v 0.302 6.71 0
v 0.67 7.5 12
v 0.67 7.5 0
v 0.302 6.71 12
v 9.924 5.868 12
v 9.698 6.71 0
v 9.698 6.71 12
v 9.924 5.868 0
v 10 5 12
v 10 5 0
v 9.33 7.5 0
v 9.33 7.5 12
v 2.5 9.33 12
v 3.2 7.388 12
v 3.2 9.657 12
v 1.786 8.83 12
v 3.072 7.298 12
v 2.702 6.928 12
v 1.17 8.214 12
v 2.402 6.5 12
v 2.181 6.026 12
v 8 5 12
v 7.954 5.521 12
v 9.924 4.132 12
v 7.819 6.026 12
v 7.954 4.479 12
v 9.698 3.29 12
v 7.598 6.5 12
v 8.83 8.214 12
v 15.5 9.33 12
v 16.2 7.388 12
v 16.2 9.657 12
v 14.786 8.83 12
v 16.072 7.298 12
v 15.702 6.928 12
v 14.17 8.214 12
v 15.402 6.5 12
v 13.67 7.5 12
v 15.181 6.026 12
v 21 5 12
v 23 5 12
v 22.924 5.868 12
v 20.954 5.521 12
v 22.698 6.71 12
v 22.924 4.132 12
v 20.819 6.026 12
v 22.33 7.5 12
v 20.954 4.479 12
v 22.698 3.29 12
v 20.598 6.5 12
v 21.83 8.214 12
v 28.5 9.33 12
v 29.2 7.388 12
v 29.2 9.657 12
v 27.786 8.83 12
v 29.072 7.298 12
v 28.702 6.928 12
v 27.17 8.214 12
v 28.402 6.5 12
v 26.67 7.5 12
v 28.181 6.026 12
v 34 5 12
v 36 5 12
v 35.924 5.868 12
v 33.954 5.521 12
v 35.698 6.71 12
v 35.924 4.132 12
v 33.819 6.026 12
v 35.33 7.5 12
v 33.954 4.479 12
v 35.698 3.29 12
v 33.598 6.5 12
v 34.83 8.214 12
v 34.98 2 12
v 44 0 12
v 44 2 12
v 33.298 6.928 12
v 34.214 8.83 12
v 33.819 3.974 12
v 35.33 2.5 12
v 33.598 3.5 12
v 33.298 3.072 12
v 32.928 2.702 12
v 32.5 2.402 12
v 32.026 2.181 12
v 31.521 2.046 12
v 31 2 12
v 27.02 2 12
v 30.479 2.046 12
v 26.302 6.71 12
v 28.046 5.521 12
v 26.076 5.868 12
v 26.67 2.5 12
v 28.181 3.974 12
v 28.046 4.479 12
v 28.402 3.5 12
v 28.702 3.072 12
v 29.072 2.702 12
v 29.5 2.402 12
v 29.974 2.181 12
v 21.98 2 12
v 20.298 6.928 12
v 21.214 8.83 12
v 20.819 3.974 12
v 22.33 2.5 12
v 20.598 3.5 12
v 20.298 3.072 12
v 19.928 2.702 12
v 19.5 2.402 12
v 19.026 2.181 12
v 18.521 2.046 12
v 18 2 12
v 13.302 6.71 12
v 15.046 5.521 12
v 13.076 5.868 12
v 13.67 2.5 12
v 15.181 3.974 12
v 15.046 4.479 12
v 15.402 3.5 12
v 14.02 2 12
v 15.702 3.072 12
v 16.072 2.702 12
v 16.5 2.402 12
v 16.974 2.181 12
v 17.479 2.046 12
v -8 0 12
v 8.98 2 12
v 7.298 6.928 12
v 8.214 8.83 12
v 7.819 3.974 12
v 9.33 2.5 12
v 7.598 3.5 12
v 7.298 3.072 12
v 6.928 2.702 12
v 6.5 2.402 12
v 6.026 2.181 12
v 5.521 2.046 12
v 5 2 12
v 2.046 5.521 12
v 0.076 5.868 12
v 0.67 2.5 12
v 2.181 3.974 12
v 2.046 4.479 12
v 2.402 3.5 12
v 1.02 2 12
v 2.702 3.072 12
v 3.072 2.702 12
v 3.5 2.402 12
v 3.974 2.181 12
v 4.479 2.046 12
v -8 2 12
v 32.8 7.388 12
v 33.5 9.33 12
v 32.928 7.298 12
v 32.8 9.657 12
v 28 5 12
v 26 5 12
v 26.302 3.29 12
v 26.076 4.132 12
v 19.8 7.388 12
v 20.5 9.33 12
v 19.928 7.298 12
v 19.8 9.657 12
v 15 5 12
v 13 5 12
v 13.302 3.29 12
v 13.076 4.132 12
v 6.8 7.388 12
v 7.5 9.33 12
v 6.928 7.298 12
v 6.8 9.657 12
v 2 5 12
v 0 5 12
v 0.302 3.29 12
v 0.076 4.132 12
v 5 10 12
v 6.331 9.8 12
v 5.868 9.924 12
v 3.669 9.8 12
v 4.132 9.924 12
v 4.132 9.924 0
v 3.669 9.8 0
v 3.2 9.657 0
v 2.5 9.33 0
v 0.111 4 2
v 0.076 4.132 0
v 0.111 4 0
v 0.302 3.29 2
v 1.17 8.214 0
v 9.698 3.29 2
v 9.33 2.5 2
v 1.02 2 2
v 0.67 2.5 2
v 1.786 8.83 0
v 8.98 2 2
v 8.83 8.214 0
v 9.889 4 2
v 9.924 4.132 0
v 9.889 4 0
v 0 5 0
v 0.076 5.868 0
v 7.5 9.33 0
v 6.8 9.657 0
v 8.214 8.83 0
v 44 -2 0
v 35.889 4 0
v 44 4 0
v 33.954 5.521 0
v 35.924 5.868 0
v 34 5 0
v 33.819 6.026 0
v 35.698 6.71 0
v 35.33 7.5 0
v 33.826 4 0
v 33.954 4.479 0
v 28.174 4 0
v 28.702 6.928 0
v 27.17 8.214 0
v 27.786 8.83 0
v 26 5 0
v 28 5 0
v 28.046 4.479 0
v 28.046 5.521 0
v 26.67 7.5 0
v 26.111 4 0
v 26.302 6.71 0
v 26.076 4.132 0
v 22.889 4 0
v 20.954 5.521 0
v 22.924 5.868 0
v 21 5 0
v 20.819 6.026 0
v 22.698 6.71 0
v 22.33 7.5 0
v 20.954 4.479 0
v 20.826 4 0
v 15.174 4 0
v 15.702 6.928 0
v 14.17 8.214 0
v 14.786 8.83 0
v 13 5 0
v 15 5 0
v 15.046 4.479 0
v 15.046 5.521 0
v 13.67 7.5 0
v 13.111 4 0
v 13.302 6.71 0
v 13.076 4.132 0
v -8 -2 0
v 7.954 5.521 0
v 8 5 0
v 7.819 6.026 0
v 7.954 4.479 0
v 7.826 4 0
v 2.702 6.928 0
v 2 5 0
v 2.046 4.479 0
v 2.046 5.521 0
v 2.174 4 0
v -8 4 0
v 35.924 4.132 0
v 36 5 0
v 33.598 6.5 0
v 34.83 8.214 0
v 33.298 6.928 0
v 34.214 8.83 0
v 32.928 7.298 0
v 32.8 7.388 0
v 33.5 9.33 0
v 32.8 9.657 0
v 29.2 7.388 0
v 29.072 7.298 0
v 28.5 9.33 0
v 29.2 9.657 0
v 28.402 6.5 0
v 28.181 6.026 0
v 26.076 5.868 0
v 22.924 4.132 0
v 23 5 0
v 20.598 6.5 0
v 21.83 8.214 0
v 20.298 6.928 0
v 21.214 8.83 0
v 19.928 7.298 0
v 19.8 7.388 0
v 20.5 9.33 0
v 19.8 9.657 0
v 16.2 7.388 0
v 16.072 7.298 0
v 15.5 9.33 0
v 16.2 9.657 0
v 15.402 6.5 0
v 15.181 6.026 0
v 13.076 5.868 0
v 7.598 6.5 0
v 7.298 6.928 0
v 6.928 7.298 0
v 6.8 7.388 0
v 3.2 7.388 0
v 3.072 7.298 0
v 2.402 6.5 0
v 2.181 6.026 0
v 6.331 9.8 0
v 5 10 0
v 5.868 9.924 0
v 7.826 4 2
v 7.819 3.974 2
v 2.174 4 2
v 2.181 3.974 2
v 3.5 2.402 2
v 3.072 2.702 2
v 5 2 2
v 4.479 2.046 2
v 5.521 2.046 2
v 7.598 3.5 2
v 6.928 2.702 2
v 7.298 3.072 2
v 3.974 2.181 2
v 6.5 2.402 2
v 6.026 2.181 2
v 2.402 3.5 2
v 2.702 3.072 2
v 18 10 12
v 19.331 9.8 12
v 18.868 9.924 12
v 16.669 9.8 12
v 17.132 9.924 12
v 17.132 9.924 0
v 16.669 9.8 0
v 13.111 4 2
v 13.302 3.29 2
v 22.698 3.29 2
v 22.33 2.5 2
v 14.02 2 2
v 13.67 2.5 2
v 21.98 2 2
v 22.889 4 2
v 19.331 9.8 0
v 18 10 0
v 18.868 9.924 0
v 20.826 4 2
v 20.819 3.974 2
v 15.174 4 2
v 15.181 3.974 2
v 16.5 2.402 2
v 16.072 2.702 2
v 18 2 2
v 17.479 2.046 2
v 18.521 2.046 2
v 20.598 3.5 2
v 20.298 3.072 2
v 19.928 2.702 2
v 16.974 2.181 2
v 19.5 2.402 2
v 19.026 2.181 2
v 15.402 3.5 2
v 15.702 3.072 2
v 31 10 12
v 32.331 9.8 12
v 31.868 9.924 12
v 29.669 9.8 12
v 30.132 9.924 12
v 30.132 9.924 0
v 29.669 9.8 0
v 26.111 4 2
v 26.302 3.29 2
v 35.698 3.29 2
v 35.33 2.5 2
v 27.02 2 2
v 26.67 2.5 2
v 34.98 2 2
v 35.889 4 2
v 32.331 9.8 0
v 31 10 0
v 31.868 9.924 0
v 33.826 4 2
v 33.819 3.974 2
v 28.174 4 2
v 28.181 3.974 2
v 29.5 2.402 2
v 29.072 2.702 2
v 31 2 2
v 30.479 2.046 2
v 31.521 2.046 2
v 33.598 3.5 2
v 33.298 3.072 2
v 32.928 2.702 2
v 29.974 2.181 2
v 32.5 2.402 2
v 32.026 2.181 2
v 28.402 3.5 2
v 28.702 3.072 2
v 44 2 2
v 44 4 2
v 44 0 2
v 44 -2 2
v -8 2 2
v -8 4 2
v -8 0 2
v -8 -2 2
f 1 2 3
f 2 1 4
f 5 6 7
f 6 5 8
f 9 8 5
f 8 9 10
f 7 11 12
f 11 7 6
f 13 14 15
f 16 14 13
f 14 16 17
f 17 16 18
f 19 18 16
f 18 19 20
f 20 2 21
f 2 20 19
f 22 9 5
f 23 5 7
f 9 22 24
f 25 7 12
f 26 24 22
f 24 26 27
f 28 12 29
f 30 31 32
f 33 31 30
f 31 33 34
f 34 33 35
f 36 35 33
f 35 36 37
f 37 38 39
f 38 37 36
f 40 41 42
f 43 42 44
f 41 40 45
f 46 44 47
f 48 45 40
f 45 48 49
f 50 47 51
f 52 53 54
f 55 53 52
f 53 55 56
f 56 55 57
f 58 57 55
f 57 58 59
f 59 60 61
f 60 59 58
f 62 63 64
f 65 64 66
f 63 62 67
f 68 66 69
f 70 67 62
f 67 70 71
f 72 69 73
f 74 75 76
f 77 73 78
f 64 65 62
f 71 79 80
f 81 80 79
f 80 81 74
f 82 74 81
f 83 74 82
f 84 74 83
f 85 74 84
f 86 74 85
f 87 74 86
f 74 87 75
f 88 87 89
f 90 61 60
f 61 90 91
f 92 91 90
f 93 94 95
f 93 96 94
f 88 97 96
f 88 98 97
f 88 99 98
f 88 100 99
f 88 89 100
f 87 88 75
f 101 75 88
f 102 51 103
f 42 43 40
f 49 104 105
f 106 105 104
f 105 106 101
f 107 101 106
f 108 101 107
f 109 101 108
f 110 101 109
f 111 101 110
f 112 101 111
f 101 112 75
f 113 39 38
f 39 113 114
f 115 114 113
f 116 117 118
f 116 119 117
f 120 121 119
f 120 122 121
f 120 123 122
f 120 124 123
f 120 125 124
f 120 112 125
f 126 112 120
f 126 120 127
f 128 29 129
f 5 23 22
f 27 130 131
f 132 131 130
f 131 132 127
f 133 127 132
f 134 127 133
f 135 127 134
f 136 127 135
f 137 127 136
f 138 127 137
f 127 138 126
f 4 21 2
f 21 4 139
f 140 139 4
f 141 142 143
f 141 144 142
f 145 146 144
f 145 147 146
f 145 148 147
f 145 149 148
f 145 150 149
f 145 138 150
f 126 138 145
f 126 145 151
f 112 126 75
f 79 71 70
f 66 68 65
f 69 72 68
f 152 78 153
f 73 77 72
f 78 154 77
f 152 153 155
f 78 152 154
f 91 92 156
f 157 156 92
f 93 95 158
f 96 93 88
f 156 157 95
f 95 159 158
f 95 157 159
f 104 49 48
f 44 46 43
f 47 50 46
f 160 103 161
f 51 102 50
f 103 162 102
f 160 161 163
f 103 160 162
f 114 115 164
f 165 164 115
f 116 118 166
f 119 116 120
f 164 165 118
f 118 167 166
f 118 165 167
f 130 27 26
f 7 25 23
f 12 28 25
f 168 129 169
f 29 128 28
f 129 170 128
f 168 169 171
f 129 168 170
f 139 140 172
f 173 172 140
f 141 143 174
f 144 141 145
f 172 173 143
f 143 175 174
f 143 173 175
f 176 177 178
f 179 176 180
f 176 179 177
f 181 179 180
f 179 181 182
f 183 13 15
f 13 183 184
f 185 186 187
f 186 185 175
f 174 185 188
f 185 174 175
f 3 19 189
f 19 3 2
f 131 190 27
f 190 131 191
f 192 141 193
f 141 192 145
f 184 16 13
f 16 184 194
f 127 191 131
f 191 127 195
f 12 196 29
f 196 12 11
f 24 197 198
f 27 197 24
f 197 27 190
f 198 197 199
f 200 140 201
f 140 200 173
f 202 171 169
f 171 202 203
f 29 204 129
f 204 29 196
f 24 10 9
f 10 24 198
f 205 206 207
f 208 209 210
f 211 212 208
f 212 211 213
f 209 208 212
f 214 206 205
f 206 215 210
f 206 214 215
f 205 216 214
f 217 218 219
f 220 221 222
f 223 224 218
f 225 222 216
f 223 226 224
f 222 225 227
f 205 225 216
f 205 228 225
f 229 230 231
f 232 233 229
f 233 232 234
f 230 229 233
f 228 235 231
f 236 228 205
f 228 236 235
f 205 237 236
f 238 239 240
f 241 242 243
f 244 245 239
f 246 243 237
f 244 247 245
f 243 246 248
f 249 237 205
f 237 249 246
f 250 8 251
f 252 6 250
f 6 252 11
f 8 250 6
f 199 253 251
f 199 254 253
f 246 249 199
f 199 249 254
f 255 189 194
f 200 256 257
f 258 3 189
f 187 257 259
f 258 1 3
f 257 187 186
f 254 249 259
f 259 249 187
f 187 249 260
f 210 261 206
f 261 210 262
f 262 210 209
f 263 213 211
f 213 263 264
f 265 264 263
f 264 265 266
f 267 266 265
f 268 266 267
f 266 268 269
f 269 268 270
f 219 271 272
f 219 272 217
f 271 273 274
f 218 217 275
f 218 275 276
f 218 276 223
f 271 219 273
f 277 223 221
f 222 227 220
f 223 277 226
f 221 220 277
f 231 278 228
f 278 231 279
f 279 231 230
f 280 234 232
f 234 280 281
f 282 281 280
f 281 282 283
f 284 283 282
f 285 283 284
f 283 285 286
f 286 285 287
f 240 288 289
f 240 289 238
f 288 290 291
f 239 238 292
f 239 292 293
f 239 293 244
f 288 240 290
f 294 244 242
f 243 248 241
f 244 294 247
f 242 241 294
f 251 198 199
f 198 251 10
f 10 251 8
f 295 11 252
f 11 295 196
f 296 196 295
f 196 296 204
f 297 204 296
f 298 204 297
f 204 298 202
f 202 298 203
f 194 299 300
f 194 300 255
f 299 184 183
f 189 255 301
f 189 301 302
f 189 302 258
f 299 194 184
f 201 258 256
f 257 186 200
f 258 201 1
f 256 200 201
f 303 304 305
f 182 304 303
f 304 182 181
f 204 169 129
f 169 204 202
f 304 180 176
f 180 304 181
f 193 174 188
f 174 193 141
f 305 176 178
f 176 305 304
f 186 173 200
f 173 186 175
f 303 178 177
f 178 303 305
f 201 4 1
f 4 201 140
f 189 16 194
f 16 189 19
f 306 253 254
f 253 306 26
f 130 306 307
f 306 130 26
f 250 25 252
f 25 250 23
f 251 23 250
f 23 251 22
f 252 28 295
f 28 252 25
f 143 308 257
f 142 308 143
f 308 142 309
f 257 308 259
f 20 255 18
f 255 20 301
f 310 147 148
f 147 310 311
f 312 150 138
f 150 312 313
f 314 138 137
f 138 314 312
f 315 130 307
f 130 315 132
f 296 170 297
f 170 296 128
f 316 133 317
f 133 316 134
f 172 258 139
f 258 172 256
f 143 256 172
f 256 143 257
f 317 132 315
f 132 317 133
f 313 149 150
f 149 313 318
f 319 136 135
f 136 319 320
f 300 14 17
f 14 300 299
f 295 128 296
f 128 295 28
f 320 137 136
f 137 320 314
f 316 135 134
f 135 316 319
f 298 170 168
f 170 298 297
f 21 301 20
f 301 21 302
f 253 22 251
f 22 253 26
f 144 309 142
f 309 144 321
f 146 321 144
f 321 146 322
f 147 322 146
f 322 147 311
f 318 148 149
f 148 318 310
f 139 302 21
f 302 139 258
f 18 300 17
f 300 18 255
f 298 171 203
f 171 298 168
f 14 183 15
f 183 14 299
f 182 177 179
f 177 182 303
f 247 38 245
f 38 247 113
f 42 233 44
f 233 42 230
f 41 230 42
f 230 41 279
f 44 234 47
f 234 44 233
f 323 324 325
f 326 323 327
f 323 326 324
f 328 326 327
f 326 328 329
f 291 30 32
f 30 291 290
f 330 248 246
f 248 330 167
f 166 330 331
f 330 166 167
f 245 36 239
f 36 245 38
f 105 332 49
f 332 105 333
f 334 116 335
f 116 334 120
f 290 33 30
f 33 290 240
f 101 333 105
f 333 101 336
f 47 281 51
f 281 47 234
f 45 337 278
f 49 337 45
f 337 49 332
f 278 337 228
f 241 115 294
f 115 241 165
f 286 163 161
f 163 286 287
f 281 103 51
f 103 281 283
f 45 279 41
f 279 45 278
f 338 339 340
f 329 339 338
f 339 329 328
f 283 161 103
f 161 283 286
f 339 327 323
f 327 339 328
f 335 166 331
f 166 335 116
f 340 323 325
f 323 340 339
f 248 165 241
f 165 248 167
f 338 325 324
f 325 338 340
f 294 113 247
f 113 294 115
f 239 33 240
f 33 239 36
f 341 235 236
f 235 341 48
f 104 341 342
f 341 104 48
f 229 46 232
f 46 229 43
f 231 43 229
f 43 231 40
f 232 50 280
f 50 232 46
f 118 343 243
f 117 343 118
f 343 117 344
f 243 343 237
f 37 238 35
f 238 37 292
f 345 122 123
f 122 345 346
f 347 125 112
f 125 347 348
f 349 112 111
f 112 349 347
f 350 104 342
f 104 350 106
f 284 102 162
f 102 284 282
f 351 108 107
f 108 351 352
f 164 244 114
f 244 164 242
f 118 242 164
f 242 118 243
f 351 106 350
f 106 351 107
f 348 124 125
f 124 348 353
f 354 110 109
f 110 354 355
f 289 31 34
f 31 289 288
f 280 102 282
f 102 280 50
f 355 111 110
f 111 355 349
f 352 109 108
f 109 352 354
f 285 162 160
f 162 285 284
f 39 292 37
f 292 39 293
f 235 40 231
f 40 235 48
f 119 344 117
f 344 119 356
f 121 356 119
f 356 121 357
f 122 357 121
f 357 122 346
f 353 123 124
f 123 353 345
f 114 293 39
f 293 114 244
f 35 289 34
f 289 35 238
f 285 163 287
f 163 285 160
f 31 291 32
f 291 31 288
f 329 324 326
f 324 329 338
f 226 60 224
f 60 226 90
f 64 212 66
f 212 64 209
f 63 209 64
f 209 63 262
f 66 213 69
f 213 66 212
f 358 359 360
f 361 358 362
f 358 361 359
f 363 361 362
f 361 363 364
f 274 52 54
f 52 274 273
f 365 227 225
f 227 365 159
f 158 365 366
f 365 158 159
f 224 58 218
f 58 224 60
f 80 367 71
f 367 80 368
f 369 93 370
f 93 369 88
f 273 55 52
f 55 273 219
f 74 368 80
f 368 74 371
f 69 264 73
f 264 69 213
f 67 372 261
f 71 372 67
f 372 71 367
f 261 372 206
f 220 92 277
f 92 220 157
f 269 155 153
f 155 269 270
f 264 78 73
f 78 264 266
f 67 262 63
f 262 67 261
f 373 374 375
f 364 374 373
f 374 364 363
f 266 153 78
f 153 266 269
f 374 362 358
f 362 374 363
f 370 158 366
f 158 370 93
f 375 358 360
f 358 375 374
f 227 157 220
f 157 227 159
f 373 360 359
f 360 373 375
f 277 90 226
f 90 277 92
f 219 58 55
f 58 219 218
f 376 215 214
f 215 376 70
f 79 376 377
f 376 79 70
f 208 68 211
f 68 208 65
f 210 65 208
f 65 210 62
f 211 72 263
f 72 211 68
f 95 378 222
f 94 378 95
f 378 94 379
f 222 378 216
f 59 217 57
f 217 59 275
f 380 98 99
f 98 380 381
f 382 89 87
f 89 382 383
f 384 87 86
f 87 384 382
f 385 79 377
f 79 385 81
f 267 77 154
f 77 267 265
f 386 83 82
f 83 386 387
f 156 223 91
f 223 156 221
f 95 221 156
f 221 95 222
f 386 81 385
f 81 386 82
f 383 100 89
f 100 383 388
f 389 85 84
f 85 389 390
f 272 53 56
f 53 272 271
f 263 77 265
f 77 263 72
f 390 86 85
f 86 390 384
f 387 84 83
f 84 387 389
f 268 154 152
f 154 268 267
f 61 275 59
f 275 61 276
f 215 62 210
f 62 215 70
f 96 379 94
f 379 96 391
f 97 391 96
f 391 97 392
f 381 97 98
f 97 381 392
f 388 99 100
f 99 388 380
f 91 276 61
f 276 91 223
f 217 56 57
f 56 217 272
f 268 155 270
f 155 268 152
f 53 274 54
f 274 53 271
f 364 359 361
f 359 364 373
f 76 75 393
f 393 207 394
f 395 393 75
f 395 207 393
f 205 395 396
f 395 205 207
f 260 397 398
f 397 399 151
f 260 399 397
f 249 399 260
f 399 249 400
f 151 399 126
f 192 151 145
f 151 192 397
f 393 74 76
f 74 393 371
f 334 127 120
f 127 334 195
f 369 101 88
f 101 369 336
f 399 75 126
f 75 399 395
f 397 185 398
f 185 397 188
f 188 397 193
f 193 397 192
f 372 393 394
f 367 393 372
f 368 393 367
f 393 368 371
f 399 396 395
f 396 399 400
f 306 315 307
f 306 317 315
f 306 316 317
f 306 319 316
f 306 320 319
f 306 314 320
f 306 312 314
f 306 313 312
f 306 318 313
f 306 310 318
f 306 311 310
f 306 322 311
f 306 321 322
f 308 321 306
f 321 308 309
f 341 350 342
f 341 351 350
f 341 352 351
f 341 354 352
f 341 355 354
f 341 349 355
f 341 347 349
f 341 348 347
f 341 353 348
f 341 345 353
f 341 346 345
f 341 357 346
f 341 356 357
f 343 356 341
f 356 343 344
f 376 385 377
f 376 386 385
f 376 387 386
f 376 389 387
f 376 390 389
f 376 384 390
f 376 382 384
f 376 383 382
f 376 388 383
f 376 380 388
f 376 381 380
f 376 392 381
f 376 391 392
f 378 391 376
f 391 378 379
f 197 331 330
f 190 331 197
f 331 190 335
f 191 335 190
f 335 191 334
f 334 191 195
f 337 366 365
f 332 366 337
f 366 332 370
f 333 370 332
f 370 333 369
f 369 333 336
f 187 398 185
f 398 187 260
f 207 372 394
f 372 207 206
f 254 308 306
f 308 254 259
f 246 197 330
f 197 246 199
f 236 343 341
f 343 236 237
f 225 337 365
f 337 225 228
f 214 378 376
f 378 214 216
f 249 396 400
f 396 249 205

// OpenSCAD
// Vorea Studio — Parametric Cable Organizer Clip
// Desk-mount cable clip with adjustable channel count and sizes
// Compatible: Vorea Studio SCAD Engine

// [Section: Cable Settings]
cable_diameter = 6;    // [3:0.5:12] Diametro del cable (mm)
channels = 3;          // [1:1:6] Numero de canales
channel_gap = 3;       // [2:1:8] Espacio entre canales

// [Section: Clip Design]
wall = 2;              // [1.5:0.5:4] Grosor de pared
clip_height = 12;      // [8:2:25] Altura del clip
base_width = 8;        // [5:1:15] Extension de la base
opening_factor = 0.6;  // [0.4:0.1:0.8] Apertura del clip (0.4=cerrado, 0.8=abierto)

// [Section: Mount]
adhesive_pad = 1;      // [0:1:1] Plataforma adhesiva (0=no, 1=si)
screw_hole = 0;        // [0:1:1] Agujero para tornillo (0=no, 1=si)

$fn = 36;

r = cable_diameter / 2;
total_width = channels * (cable_diameter + wall*2) + (channels - 1) * channel_gap;

// Base plate
translate([-base_width, 0, 0])
  cube([total_width + base_width * 2, wall, clip_height]);

// Adhesive pad
if (adhesive_pad == 1) {
  translate([-base_width, -wall, 0])
    cube([total_width + base_width * 2, wall * 3, wall]);
}

// Screw hole
if (screw_hole == 1) {
  difference() {
    translate([total_width/2, -wall*2, 0])
      cylinder(r=4, h=wall);
    translate([total_width/2, -wall*2, -0.5])
      cylinder(r=1.5, h=wall+1);
  }
}

// Cable channels
for (i = [0 : channels - 1]) {
  cx = i * (cable_diameter + wall*2 + channel_gap) + r + wall;
  
  translate([cx, wall + r, clip_height/2])
    rotate([0, 0, 0])
      difference() {
        // Outer ring
        cylinder(r = r + wall, h = clip_height, center = true);
        // Inner channel
        cylinder(r = r, h = clip_height + 1, center = true);
        // Opening slot
        translate([0, r * opening_factor, 0])
          cube([r * opening_factor * 2, r * 2, clip_height + 2], center = true);
      }
}
